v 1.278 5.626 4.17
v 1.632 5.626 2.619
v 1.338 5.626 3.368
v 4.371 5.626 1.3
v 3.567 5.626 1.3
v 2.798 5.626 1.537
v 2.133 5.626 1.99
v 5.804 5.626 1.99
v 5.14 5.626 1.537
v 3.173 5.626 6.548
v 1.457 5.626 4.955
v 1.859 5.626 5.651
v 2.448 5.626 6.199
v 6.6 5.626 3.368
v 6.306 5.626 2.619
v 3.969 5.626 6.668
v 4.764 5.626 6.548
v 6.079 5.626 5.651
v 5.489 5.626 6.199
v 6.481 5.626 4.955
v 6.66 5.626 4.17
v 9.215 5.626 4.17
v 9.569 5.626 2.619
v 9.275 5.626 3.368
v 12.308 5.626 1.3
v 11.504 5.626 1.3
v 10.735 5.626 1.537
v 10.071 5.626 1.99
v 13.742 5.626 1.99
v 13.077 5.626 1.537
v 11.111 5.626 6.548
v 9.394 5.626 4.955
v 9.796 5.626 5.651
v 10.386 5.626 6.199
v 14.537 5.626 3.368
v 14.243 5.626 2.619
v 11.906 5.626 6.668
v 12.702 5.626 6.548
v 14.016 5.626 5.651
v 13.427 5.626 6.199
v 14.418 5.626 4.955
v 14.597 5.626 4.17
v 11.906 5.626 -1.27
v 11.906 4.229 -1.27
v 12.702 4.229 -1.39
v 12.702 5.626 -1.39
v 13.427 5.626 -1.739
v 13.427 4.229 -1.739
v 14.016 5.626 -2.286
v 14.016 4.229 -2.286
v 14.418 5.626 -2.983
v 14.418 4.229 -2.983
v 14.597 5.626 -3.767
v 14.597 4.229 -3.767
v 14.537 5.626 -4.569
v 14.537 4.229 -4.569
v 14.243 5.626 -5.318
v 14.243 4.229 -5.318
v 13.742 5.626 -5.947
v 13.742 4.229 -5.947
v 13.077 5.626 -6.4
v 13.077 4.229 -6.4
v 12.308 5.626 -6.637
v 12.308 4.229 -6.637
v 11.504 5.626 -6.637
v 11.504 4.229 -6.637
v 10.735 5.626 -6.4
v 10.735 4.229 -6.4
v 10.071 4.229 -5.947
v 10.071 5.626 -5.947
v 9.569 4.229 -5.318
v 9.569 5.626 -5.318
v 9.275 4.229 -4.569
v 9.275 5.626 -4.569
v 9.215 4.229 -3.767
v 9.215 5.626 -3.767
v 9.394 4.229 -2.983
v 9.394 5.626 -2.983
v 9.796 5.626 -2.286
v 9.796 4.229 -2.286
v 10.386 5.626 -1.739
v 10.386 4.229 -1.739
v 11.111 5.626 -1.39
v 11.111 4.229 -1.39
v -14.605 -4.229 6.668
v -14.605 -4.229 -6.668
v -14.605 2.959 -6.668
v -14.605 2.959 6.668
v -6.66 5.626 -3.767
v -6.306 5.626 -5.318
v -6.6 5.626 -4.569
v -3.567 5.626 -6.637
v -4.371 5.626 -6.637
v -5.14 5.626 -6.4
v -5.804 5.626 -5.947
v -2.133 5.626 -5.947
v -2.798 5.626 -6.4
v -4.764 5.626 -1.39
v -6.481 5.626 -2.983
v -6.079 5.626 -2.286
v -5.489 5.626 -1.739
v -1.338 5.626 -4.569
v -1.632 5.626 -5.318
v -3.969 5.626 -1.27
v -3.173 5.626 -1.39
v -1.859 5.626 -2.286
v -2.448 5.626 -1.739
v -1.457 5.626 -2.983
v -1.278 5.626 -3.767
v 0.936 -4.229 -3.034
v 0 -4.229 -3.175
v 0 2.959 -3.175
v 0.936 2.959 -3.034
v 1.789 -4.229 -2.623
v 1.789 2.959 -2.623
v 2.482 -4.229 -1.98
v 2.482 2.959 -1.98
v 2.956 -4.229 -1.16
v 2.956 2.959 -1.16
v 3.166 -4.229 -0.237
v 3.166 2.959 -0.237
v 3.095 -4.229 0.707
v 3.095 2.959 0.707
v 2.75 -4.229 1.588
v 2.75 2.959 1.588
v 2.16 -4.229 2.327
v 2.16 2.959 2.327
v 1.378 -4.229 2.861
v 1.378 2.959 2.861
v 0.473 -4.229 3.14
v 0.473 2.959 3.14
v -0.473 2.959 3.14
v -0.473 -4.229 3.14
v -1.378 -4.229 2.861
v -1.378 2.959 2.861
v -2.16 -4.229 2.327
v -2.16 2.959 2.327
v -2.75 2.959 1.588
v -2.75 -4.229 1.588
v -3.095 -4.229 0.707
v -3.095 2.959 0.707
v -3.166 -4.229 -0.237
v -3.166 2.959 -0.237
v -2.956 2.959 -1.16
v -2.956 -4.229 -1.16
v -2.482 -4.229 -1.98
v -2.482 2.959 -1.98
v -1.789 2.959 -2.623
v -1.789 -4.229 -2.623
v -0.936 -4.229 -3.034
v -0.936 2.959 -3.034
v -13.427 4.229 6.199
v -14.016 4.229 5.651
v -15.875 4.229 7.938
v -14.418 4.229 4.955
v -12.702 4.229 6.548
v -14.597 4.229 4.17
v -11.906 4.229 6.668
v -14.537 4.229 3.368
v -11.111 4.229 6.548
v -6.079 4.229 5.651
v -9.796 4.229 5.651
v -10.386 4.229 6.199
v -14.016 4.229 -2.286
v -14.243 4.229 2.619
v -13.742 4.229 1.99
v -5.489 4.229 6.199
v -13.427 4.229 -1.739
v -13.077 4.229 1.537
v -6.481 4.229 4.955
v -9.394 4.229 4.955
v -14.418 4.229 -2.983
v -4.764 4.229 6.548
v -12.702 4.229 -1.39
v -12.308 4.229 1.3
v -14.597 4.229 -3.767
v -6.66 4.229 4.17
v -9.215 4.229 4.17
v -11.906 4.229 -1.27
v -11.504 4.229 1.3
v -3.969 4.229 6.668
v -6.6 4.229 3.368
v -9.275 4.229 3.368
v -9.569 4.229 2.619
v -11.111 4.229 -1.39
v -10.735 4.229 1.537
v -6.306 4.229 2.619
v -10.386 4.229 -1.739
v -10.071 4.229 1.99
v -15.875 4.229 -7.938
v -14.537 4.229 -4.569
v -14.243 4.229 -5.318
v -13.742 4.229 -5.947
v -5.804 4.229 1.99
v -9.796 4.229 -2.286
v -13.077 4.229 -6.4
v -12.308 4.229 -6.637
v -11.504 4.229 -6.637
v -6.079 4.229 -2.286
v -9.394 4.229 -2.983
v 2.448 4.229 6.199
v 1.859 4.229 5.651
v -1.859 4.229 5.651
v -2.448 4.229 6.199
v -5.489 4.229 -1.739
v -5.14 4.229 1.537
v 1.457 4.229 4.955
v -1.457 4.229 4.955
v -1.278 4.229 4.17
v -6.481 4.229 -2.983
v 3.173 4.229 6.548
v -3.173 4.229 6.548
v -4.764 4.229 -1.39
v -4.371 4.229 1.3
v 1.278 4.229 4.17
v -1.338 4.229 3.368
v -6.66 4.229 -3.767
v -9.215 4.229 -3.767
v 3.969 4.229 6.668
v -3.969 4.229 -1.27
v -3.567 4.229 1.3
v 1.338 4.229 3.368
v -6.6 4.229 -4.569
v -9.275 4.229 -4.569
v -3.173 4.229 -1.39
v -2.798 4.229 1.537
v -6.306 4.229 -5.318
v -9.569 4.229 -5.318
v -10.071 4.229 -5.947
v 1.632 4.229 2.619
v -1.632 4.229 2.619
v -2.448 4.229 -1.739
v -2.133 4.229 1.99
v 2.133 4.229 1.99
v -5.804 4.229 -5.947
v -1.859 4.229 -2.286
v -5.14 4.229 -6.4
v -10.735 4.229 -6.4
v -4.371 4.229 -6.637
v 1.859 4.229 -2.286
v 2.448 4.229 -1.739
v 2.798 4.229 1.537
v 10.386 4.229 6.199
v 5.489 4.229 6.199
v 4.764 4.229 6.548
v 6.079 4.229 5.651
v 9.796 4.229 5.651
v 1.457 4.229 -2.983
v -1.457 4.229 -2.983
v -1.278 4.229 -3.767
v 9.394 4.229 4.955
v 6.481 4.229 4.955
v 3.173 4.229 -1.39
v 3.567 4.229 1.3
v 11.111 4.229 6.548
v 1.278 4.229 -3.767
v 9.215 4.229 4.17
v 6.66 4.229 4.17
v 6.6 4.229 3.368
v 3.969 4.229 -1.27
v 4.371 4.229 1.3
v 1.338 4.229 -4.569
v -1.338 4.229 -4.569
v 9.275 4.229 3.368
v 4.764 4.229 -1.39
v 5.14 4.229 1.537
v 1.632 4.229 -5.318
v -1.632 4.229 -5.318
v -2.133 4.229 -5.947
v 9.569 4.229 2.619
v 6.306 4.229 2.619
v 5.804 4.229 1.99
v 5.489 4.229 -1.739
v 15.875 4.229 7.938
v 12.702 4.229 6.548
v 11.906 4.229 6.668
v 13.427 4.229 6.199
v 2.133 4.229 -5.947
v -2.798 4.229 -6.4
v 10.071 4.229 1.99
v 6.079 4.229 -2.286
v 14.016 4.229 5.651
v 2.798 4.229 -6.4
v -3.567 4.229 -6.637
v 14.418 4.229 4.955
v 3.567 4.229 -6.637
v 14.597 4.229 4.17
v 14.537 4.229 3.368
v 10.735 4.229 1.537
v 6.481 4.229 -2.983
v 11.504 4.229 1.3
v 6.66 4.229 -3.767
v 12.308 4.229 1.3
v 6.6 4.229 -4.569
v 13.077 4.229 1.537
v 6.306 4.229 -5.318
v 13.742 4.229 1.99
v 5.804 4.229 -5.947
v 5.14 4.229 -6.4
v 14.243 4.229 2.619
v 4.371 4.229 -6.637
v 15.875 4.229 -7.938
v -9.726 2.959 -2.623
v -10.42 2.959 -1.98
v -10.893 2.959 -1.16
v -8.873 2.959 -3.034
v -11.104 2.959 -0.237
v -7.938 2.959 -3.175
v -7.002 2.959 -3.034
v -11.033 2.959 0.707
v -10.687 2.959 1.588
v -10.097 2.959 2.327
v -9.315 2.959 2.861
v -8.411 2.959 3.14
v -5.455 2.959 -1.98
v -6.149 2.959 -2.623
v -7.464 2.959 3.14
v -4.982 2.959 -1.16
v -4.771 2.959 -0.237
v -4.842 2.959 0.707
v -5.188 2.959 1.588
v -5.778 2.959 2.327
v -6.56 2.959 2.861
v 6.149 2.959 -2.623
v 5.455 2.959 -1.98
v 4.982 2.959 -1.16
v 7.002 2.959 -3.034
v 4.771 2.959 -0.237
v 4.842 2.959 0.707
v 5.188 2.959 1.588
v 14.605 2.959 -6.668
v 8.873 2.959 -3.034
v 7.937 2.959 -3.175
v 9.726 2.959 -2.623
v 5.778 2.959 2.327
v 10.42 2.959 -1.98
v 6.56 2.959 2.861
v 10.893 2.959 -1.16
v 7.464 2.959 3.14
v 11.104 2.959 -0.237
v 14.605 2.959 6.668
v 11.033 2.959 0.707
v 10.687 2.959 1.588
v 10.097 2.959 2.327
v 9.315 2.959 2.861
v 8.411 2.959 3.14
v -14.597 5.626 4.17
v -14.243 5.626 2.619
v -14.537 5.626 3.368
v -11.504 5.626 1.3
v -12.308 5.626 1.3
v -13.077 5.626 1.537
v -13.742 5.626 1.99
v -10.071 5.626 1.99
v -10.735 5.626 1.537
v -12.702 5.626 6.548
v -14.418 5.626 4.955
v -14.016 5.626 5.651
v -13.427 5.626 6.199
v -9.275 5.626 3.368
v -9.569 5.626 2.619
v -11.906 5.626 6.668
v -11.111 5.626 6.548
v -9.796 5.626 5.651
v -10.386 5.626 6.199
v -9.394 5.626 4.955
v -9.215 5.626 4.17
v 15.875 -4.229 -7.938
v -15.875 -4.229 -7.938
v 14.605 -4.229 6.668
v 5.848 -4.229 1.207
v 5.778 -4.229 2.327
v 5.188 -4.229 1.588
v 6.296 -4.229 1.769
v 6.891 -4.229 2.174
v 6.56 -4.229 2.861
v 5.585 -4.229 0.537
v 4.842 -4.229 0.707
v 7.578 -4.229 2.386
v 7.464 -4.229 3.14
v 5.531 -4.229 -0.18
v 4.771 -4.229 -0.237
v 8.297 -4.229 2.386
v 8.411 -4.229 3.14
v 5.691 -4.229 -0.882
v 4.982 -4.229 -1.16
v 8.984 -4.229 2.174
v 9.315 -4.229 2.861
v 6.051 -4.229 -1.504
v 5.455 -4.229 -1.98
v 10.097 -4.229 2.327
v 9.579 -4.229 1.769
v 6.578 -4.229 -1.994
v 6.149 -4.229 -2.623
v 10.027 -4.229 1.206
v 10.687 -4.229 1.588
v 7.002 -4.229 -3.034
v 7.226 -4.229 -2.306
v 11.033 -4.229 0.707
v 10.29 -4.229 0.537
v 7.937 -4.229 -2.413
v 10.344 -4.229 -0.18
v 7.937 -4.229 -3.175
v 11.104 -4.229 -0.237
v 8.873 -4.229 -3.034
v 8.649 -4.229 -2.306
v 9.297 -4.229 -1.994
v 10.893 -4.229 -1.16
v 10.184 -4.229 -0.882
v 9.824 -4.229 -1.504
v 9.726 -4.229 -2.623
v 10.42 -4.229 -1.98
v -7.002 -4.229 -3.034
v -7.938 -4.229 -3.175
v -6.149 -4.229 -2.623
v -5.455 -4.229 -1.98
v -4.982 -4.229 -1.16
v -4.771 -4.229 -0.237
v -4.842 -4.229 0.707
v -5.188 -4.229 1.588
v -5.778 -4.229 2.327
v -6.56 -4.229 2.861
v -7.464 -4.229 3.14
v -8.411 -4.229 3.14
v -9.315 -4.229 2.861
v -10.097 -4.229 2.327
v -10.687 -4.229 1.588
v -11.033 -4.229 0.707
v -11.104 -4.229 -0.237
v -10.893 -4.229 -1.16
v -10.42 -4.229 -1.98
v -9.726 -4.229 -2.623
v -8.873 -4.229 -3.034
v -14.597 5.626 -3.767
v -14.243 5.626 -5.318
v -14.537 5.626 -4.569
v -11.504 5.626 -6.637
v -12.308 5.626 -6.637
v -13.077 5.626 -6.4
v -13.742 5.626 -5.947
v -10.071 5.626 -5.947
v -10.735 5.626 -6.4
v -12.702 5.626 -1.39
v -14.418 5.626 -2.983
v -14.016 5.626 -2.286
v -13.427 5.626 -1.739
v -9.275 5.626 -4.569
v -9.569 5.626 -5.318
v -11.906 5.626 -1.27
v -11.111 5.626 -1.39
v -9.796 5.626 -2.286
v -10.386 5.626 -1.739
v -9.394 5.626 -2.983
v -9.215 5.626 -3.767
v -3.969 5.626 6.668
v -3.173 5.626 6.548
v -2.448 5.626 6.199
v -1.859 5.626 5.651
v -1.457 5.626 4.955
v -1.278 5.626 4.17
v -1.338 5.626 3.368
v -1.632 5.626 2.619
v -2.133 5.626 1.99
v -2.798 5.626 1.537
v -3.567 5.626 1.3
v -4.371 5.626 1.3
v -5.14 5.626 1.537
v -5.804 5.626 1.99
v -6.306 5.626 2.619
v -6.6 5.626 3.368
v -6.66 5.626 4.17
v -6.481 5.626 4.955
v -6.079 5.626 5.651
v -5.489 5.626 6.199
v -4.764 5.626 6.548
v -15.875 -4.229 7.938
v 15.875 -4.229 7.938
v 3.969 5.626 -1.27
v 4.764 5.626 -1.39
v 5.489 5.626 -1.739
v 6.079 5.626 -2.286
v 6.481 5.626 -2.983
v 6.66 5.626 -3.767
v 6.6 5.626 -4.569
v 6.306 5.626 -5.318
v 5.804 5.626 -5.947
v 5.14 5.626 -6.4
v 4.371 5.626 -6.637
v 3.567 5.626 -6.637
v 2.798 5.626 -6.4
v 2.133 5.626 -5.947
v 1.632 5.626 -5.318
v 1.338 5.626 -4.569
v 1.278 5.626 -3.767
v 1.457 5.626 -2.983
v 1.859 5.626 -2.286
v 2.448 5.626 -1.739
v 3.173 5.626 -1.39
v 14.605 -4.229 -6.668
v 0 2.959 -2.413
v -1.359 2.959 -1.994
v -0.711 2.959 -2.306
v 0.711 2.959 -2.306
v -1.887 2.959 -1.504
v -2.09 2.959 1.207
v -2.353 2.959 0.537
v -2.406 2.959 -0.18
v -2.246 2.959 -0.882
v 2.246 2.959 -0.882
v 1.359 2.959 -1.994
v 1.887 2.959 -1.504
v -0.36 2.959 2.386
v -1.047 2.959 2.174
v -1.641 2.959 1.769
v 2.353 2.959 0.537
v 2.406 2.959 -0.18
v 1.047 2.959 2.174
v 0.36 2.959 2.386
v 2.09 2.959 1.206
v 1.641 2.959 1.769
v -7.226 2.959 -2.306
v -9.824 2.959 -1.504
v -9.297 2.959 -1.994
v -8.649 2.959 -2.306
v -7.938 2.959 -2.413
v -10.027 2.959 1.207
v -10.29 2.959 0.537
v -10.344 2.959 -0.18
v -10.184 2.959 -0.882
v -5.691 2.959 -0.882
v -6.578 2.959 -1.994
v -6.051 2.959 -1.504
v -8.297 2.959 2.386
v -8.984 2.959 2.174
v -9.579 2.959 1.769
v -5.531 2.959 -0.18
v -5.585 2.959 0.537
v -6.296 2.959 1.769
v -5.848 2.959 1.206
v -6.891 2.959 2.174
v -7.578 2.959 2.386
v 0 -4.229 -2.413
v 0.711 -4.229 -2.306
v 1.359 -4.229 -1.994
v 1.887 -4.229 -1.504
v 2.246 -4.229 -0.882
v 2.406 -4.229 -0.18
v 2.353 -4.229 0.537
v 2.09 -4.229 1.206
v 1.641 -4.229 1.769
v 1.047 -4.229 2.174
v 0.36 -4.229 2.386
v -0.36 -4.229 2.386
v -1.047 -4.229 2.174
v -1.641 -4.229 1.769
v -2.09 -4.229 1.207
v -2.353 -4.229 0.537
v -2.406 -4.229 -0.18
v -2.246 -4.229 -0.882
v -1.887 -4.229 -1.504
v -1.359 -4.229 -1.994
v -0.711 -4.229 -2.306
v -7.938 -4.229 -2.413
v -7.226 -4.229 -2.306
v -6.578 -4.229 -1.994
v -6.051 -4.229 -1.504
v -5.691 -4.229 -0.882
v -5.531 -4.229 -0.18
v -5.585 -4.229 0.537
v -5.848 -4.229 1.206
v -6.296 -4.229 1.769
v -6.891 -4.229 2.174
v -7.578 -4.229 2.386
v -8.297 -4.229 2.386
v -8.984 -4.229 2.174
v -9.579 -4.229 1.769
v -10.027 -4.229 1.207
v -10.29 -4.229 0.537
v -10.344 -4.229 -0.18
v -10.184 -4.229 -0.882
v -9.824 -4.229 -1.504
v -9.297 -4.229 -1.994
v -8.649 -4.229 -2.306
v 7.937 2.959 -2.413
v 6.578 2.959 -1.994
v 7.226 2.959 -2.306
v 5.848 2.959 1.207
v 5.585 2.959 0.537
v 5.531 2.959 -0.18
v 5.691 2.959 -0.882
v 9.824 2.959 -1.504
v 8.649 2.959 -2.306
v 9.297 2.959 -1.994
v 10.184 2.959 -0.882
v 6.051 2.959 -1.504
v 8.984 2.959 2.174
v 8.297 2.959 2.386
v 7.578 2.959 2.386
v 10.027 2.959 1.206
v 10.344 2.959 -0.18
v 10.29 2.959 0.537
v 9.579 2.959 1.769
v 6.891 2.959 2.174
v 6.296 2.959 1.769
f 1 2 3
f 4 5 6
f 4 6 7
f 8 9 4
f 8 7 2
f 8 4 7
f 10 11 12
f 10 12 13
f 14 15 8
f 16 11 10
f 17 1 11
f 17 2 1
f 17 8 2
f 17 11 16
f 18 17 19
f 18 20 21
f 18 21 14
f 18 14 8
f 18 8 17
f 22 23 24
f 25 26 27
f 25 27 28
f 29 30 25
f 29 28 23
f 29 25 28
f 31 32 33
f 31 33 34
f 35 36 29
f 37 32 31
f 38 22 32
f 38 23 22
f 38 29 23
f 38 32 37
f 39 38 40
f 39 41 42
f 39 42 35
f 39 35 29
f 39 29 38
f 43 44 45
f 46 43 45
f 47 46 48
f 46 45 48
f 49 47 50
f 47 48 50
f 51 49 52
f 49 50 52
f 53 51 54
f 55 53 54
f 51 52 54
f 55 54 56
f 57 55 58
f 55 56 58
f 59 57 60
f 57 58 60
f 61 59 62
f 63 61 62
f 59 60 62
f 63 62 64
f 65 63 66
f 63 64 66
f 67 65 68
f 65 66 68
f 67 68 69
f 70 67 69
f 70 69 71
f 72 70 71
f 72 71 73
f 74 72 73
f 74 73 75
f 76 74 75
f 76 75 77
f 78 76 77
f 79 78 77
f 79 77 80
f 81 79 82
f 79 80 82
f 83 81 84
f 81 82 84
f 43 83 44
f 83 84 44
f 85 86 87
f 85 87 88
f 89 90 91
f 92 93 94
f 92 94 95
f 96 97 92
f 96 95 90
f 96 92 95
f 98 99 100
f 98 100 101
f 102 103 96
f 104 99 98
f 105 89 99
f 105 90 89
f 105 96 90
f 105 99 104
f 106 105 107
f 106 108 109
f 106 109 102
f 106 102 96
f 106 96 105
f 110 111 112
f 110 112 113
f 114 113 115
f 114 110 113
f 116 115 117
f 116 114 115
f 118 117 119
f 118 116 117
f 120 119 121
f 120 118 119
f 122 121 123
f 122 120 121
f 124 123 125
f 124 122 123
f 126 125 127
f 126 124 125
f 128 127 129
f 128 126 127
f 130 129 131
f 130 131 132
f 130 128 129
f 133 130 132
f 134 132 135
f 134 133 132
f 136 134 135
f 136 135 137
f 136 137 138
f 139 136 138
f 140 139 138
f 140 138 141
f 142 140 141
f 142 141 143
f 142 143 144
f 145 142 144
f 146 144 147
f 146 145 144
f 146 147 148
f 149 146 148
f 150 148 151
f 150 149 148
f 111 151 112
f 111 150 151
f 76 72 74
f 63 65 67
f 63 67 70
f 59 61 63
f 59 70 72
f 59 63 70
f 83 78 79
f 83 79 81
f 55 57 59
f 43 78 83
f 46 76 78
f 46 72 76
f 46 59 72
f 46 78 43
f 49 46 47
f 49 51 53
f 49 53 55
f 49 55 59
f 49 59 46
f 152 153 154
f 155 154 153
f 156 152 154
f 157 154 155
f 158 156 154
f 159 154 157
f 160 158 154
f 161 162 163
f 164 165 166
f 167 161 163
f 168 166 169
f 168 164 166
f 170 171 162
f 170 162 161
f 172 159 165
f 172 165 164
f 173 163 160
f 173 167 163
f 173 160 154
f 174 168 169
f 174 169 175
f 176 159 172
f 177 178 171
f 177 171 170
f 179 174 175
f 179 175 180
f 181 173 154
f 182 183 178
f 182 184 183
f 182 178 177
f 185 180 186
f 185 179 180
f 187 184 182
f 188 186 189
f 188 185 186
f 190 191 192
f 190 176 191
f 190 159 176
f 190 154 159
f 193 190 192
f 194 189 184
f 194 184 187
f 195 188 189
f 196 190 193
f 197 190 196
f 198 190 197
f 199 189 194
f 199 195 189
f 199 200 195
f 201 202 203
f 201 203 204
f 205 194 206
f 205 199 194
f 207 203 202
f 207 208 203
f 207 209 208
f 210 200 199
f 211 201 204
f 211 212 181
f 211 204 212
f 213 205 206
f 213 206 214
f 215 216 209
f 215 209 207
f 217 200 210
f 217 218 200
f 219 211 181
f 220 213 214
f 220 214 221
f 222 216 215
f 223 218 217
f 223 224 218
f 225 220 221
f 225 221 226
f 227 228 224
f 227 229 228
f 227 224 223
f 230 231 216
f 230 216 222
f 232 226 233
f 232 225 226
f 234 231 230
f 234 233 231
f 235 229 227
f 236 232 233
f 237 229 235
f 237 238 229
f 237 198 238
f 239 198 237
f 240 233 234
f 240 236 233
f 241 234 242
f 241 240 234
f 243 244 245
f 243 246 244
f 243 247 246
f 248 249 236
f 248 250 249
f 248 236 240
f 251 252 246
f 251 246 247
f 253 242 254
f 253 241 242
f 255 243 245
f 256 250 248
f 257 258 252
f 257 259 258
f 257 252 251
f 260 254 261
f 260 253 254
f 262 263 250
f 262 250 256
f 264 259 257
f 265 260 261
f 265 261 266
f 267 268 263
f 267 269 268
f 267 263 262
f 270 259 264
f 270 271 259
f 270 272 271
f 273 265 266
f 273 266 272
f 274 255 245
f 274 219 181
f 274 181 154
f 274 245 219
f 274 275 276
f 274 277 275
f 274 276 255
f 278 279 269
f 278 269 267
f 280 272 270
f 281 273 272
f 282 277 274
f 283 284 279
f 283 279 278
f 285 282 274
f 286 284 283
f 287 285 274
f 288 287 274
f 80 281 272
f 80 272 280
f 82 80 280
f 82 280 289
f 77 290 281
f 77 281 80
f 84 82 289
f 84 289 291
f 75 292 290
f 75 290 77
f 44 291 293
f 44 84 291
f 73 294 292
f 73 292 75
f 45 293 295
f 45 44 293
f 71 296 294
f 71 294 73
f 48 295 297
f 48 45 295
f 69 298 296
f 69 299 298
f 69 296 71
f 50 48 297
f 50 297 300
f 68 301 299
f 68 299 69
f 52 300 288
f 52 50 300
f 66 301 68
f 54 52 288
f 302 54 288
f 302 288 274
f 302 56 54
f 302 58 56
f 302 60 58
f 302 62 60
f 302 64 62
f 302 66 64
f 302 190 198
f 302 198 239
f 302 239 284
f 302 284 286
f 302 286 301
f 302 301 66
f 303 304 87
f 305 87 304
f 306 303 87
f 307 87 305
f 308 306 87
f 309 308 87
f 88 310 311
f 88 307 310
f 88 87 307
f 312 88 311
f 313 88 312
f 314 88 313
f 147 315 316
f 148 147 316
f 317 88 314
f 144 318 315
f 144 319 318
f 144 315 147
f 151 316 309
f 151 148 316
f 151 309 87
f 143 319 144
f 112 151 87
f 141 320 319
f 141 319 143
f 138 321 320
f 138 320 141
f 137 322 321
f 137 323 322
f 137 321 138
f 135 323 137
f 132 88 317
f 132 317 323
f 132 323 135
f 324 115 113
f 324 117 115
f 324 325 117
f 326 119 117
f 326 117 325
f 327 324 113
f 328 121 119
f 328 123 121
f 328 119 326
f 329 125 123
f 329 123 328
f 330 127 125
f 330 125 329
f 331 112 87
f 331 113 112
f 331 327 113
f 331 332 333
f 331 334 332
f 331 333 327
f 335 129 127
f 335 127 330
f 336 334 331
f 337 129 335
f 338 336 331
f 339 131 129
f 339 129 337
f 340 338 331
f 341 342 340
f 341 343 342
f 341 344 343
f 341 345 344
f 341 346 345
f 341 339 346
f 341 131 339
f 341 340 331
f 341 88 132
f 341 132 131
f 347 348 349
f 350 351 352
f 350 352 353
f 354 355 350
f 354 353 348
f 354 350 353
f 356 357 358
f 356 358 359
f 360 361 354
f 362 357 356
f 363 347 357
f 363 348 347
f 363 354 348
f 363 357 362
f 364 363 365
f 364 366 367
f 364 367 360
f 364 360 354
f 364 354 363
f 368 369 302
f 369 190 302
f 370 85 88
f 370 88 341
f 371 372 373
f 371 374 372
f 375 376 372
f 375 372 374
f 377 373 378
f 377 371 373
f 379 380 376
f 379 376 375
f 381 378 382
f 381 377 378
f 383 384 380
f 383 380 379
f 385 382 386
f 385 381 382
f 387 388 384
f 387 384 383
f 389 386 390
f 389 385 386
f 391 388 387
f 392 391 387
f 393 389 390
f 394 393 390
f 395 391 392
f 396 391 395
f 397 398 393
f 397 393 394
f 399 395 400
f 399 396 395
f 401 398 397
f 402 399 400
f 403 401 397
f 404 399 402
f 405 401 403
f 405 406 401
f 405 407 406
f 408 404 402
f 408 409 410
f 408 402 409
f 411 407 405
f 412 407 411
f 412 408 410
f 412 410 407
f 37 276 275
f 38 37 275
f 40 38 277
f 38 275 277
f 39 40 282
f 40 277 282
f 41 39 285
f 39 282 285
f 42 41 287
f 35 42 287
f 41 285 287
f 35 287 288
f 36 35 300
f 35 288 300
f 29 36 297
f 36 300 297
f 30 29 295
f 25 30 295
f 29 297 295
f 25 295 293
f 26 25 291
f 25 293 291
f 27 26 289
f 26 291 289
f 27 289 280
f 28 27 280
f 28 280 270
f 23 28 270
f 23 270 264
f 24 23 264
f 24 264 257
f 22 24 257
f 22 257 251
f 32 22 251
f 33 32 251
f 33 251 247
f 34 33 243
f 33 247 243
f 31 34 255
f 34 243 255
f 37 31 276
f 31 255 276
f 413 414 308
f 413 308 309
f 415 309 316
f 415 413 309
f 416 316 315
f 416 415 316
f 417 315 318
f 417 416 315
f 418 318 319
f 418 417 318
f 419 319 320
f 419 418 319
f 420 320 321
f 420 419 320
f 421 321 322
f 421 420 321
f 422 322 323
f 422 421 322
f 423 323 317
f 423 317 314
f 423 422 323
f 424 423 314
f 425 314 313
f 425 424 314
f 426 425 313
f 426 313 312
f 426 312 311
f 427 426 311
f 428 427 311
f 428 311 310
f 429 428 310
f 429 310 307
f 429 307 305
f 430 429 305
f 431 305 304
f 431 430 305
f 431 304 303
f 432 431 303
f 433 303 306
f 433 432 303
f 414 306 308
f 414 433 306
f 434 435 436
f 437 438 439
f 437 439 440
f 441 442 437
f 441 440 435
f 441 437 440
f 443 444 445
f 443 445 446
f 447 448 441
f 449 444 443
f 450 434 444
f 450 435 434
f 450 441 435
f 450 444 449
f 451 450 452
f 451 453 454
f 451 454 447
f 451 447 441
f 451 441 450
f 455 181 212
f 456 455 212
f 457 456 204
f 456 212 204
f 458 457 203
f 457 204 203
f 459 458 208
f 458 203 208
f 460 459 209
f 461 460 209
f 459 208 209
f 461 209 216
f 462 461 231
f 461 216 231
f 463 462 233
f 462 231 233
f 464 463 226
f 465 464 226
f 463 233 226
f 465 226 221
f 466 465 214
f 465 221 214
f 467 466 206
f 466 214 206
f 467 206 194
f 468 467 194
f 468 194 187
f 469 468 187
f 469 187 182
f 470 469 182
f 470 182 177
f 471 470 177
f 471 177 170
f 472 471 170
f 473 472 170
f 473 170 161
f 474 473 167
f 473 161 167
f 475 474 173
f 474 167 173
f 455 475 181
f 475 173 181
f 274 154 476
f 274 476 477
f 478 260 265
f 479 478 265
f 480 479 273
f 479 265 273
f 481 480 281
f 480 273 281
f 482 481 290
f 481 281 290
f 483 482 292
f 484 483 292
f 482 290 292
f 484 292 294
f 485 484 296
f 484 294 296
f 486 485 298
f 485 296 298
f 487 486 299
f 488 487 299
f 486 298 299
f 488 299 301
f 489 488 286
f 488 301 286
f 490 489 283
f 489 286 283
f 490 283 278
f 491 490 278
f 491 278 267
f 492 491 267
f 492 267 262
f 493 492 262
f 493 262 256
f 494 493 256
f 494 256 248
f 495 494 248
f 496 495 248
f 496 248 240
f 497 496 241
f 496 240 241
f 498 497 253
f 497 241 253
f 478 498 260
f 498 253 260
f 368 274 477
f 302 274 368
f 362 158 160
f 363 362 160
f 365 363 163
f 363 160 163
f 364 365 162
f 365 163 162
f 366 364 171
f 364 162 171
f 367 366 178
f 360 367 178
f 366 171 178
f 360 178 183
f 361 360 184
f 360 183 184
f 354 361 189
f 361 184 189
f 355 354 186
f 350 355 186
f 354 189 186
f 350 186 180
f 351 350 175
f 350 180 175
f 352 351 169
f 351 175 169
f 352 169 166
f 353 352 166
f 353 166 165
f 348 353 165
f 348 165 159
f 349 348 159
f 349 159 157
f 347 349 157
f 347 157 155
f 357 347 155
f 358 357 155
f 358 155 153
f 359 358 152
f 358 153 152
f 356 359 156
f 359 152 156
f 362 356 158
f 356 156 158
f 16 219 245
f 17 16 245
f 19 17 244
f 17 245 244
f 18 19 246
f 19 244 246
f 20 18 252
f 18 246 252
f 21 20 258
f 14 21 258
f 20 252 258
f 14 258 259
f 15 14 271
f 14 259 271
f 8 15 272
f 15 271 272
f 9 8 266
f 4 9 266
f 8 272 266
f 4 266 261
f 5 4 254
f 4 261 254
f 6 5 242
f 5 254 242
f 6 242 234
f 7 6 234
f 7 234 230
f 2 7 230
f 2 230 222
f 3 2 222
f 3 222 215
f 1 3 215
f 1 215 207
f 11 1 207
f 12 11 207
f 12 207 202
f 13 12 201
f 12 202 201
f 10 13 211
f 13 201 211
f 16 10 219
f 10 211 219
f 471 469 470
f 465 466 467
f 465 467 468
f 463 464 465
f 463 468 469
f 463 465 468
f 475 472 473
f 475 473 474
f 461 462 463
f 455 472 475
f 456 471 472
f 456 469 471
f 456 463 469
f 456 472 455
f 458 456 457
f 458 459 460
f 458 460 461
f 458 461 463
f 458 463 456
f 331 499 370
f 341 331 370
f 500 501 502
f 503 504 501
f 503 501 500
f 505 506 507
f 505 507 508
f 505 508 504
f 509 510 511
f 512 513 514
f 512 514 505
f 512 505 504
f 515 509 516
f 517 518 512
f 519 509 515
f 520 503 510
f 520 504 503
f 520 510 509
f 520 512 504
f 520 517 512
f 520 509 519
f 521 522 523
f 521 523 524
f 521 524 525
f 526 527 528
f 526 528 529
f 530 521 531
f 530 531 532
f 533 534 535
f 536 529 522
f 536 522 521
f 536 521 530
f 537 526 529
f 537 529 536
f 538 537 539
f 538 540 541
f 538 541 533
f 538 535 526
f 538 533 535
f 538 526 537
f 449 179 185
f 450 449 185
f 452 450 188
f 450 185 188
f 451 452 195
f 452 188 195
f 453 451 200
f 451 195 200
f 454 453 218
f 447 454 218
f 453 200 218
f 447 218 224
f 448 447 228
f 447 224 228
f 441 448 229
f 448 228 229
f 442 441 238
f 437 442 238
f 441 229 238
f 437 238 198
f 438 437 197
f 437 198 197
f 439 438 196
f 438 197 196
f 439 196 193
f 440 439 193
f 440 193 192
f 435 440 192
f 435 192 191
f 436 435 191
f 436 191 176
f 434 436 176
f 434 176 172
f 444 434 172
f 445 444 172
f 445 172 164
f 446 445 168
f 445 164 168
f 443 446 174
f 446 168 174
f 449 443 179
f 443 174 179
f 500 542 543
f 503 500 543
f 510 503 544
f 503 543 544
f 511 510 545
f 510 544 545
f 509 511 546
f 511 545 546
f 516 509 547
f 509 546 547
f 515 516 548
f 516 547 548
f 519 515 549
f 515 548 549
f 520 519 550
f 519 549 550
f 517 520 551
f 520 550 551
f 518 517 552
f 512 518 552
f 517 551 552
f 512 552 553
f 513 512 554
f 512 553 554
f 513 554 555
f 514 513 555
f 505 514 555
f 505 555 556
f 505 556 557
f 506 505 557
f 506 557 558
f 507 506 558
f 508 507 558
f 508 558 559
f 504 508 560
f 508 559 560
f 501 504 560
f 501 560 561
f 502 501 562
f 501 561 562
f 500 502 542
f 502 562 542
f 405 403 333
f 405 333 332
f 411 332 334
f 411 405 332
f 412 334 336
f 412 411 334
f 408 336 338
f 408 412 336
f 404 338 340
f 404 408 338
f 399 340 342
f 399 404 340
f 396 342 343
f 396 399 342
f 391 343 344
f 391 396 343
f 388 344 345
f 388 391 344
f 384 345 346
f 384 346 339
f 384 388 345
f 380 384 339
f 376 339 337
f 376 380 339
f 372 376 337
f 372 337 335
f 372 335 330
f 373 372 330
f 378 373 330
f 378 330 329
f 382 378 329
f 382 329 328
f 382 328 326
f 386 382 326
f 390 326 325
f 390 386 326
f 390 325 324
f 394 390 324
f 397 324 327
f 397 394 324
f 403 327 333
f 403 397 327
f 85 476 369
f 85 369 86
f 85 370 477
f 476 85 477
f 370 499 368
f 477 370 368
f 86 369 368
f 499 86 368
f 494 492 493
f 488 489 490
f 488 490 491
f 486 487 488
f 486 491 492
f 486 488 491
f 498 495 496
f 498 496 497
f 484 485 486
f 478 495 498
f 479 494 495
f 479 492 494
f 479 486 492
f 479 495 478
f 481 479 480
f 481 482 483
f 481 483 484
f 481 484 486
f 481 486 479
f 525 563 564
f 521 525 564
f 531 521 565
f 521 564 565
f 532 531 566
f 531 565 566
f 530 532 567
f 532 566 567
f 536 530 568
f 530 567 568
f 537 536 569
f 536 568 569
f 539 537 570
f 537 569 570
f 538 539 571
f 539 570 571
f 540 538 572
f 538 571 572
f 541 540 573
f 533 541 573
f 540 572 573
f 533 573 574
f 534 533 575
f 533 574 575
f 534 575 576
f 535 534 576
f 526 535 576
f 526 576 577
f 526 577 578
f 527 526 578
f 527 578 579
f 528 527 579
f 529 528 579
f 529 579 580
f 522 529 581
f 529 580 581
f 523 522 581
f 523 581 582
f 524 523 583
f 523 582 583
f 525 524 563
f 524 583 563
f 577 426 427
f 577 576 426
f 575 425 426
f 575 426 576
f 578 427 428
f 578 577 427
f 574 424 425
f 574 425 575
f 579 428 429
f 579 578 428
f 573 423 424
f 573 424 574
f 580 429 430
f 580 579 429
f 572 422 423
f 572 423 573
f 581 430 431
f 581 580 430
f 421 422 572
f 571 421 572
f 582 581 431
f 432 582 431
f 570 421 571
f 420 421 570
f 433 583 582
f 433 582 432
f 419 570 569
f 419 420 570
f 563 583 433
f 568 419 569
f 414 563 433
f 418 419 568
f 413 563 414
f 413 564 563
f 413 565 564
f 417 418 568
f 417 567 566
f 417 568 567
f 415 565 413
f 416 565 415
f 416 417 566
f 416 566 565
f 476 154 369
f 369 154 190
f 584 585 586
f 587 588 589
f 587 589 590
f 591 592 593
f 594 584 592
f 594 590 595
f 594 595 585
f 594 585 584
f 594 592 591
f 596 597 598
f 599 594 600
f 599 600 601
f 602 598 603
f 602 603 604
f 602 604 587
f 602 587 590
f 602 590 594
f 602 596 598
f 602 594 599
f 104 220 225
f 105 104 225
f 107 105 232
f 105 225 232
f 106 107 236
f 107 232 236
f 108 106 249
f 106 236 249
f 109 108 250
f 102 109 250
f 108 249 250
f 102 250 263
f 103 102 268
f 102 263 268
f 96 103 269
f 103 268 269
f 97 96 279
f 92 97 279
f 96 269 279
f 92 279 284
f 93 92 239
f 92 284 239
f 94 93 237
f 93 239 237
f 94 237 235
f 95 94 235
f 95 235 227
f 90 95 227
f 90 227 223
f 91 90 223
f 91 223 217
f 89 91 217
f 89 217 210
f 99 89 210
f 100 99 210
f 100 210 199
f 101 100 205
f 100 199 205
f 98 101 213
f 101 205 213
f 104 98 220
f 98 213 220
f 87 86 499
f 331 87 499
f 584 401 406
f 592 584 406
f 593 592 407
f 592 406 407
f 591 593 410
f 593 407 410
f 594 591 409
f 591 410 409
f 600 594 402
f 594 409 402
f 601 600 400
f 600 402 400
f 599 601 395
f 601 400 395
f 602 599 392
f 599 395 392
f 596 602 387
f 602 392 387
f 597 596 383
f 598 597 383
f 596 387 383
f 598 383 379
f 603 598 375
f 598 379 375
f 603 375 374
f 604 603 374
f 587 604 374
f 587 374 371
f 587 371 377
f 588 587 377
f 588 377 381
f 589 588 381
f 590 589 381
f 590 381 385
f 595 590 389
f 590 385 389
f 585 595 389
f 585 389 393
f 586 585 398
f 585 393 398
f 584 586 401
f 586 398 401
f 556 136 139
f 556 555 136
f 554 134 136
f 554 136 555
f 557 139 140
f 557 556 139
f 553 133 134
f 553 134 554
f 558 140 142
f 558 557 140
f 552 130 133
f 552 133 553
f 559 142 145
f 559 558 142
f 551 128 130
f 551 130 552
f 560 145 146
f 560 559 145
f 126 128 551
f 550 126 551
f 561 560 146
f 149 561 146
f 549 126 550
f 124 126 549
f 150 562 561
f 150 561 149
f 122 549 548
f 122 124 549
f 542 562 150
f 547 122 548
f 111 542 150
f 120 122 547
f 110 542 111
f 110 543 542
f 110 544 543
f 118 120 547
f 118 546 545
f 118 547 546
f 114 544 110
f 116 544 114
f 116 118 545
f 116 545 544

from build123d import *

# Parameters (mm, degrees)
SKETCH1_W            = 31.75
SKETCH1_H            = 15.875
BOSS_EXTRUDE1_DEPTH  = 4.2291
SKETCH2_W            = 29.21
SKETCH2_H            = 13.335
SKETCH2_R            = 3.175
SKETCH2_R_2          = 2.413
CUT_EXTRUDE1_DEPTH   = 7.1882
SKETCH3_R            = 2.69875
BOSS_EXTRUDE2_DEPTH  = 1.397
LPATTERN1_COUNT      = 4
LPATTERN1_PITCH      = 7.9375
LPATTERN1_COUNT_DIR2 = 2
LPATTERN1_PITCH_DIR2 = 7.9375
SKETCH2_3_R          = 3.175
SKETCH2_3_R_2        = 2.413
BOSS_EXTRUDE3_DEPTH  = 7.1882
LPATTERN2_COUNT      = 2
LPATTERN2_PITCH      = 7.9375
LPATTERN2_COL_COUNT  = 2
LPATTERN2_COL_PITCH  = 7.9375


with BuildPart() as part:
    # Sketch1 → Boss-Extrude1 (new, symmetric)
    with BuildSketch(Plane(origin=(0, 0, 0), x_dir=(1, 0, 0), z_dir=(0, 1, 0))):
        Rectangle(SKETCH1_W, SKETCH1_H)
    extrude(amount=BOSS_EXTRUDE1_DEPTH, both=True)

    # Sketch2 → Cut-Extrude1 (cut)
    with BuildSketch(Plane.XZ.offset(4.2291)):
        Rectangle(SKETCH2_W, SKETCH2_H)
        Circle(SKETCH2_R, mode=Mode.SUBTRACT)
        Circle(SKETCH2_R)
        Circle(SKETCH2_R_2, mode=Mode.SUBTRACT)
        Circle(SKETCH2_R_2)
    extrude(amount=-CUT_EXTRUDE1_DEPTH, mode=Mode.SUBTRACT)

    # Sketch3 → Boss-Extrude2 (add)
    with BuildSketch(Plane(origin=(0, 4.2291, 0), x_dir=(1, 0, 0), z_dir=(0, 1, 0))):
        with Locations(Location((11.90625, -3.96875, 0), (0, 0, 270))):
            Circle(SKETCH3_R)
    boss_extrude2 = extrude(amount=BOSS_EXTRUDE2_DEPTH)

    # LPattern1: Boss-Extrude2 4 × 2
    with Locations(*[(-i * LPATTERN1_PITCH, 0, -j * LPATTERN1_PITCH_DIR2) for i in range(LPATTERN1_COUNT) for j in range(LPATTERN1_COUNT_DIR2) if (i, j) != (0, 0)]):
        add(boss_extrude2)

    # Sketch2<3> → Boss-Extrude3 (add)
    with BuildSketch(Plane.XZ.offset(4.2291)):
        with Locations(Location((0, 0, 0), (0, 0, 270))):
            Circle(SKETCH2_3_R)
        with Locations(Location((0, 0, 0), (0, 0, 270))):
            Circle(SKETCH2_3_R_2, mode=Mode.SUBTRACT)
    boss_extrude3 = extrude(amount=-BOSS_EXTRUDE3_DEPTH)

    # LPattern2: Boss-Extrude3 ×2
    with Locations(*[(i * LPATTERN2_PITCH, 0, 0) for i in range(1, LPATTERN2_COUNT)]):
        add(boss_extrude3)

    # LPattern2 col: Boss-Extrude3 ×2
    with Locations(*[(-i * LPATTERN2_COL_PITCH, 0, 0) for i in range(1, LPATTERN2_COL_COUNT)]):
        add(boss_extrude3)


solid = part.part
